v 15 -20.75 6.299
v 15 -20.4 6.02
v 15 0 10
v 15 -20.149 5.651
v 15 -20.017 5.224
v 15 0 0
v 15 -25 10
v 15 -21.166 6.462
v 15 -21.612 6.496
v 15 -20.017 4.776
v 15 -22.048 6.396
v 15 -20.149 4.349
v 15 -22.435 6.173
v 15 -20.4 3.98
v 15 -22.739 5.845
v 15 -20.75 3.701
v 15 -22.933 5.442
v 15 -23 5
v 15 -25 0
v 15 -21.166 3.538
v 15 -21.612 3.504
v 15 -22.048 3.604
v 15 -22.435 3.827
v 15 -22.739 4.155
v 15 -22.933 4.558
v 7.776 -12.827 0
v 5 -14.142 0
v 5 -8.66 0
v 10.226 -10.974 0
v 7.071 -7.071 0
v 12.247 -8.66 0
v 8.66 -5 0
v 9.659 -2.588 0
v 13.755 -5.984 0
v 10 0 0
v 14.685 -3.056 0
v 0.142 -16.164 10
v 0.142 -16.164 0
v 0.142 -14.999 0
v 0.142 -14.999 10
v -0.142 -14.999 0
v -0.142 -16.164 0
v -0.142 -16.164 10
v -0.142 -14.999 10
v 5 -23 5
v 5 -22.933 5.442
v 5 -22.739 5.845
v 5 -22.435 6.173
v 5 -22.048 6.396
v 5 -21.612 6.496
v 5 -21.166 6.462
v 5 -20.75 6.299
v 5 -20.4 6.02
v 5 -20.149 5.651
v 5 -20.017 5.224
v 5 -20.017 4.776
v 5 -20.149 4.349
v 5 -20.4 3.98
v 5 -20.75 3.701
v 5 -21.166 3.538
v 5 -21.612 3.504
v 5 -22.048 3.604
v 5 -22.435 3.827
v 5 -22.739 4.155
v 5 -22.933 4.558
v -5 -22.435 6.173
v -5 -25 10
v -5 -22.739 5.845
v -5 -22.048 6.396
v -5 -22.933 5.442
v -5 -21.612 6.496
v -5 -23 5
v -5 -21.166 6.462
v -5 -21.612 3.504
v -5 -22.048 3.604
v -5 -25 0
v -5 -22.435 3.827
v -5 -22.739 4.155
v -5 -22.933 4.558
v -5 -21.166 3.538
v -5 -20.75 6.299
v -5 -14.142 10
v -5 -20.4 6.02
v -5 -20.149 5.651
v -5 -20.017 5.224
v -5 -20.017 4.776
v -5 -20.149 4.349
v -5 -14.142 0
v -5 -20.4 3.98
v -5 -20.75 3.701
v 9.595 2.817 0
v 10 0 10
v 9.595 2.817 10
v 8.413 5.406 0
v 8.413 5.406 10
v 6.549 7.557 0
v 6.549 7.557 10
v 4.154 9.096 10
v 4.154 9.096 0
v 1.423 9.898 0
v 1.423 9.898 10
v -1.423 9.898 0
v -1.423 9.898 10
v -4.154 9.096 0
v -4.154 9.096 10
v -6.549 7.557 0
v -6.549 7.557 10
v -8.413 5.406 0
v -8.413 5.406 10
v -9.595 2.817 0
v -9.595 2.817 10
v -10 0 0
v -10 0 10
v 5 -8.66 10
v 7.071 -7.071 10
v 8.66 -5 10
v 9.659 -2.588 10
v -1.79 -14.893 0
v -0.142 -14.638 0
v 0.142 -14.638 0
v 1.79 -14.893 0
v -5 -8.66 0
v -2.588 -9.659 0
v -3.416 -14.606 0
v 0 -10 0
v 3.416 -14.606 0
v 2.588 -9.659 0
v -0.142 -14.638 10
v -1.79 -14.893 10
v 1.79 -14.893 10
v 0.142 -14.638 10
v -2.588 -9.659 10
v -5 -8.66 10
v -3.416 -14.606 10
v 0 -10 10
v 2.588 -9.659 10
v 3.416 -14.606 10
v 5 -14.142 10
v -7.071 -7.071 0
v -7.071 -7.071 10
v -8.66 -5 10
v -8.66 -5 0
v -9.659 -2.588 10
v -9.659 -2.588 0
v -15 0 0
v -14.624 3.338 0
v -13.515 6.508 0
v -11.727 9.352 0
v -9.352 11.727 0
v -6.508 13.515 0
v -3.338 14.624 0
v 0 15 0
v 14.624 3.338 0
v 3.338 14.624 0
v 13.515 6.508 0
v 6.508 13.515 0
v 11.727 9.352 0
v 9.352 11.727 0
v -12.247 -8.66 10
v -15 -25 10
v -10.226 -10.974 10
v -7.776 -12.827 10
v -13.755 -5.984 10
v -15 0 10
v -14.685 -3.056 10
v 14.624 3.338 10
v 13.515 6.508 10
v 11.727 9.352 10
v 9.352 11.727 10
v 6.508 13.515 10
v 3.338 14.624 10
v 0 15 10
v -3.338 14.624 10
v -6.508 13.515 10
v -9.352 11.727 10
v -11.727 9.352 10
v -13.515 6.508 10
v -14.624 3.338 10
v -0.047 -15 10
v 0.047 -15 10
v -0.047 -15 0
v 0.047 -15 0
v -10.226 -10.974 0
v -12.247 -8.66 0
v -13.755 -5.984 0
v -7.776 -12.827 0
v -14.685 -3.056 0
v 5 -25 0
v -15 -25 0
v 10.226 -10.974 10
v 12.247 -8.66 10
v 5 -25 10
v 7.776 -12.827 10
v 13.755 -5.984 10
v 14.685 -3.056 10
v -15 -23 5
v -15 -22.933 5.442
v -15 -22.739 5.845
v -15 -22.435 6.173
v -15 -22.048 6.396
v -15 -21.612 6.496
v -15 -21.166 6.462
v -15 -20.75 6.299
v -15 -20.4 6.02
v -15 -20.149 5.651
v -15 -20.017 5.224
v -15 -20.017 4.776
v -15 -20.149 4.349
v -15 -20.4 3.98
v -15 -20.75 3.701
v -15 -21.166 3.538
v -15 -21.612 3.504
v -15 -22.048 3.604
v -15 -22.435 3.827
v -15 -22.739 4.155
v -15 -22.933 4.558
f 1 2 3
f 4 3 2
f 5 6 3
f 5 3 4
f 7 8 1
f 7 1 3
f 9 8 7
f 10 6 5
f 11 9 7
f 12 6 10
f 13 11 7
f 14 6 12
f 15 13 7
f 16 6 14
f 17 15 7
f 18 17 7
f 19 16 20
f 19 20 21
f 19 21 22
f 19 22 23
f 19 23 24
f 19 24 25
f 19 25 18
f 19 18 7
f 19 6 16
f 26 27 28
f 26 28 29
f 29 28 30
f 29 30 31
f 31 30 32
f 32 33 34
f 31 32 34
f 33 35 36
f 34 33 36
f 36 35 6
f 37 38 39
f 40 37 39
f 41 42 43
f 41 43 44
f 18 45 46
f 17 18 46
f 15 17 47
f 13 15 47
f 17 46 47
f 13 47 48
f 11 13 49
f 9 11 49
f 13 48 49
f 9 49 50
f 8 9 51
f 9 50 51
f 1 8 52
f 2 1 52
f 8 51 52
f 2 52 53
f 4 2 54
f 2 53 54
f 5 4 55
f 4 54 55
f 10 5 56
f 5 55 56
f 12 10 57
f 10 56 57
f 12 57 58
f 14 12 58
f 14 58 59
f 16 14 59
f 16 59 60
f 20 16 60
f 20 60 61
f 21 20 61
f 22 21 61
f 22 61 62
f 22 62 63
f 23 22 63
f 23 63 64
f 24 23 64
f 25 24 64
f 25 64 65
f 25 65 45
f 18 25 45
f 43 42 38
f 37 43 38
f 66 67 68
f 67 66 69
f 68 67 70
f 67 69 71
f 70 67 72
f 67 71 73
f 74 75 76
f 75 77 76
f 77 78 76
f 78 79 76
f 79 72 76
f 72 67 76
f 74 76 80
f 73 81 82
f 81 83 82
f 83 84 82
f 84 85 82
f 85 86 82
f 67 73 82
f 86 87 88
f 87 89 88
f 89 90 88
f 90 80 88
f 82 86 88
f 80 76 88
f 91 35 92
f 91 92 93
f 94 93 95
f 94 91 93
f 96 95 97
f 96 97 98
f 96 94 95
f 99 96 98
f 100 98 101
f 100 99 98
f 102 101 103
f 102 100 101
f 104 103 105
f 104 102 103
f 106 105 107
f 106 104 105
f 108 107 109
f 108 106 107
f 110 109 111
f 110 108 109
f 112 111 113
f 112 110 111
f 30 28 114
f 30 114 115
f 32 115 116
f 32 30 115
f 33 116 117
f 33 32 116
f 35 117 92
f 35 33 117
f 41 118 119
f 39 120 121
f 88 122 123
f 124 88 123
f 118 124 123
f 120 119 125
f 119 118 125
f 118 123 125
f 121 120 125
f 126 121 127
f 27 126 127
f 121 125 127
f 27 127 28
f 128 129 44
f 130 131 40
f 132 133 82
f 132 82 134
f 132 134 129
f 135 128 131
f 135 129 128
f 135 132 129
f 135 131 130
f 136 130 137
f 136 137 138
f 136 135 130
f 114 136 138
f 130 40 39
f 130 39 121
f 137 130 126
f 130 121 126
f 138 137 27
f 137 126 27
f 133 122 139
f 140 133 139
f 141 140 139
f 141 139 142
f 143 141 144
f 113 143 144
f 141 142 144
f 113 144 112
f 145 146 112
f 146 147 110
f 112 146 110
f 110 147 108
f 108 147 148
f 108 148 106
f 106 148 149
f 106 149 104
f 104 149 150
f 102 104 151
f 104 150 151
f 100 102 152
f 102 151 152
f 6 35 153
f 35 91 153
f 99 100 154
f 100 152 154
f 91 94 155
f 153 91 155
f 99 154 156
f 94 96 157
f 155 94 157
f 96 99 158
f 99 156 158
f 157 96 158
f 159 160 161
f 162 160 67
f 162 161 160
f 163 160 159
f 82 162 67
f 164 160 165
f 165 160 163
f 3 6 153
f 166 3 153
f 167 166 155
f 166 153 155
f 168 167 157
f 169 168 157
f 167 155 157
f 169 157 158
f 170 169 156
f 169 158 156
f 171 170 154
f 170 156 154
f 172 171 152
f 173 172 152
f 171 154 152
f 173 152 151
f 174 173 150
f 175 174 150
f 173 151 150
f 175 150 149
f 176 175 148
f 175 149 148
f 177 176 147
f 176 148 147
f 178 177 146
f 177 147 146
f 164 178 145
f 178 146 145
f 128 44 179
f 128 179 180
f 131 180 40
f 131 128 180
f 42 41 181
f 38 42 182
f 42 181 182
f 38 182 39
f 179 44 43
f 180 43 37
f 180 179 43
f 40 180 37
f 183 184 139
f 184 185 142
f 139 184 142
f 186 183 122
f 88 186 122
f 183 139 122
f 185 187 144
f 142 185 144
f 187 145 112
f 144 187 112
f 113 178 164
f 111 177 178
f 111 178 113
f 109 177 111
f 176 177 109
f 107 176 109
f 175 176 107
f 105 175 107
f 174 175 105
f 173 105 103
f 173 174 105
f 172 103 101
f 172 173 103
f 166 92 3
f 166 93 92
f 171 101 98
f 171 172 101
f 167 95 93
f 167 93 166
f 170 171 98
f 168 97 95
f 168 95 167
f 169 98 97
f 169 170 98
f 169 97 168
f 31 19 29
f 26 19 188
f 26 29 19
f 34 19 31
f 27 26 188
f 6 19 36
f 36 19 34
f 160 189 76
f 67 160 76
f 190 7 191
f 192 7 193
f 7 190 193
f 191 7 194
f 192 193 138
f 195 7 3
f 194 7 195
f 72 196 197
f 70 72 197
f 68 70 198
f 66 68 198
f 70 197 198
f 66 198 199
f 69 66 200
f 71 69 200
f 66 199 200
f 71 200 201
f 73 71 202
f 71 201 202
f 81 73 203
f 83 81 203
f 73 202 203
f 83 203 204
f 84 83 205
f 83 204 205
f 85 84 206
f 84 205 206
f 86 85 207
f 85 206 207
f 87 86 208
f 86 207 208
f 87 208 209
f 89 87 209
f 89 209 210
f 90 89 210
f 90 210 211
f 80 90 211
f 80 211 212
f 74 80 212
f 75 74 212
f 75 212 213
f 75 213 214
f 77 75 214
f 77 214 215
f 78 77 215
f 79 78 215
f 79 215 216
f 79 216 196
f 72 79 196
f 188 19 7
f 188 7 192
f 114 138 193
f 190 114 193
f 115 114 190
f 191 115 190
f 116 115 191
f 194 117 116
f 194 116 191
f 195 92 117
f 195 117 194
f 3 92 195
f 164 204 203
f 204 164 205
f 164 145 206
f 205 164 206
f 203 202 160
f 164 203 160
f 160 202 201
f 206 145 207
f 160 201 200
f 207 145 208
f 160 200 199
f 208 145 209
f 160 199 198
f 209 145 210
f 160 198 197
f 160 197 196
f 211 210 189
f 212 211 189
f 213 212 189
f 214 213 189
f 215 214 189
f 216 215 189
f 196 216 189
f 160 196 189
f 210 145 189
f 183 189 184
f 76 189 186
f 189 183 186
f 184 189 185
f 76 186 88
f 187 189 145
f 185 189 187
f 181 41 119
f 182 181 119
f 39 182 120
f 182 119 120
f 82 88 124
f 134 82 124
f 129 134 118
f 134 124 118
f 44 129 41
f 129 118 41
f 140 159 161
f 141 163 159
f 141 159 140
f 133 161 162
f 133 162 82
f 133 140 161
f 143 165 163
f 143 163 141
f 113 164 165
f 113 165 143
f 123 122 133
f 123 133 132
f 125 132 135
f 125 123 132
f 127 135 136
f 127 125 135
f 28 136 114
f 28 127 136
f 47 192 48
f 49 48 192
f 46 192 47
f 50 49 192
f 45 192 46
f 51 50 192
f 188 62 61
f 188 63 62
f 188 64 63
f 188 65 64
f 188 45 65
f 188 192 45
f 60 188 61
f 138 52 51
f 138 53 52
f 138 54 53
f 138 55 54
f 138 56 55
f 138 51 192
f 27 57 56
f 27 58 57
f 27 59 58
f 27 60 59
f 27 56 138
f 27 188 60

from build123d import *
from build123d.topology import SkipClean

# Parameters (mm, degrees)
ESQUISSE1_R             = 15
ESQUISSE1_R_2           = 10
BOSS_EXTRU_1_DEPTH      = 10
BOSS_EXTRU_2_START      = -10
ESQUISSE2_W             = 0.284758048
ESQUISSE2_H             = 1.526135502
BOSS_EXTRU_2_DEPTH      = 10
ESQUISSE3_R             = 1.5
ENL_V_MAT_EXTRU_1_DEPTH = 41.311288741


with BuildPart() as part:
    # Esquisse1 → Boss.-Extru.1 (new body)
    with BuildSketch(Plane.XY):
        Circle(ESQUISSE1_R)
        Circle(ESQUISSE1_R_2, mode=Mode.SUBTRACT)
    extrude(amount=BOSS_EXTRU_1_DEPTH)

    # Esquisse2 → Boss.-Extru.2 (add)
    with SkipClean():  # the faces are left unmerged after this step: merging them gives an invalid solid
        with BuildSketch(Plane.XY.offset(10).offset(BOSS_EXTRU_2_START)):
            with BuildLine():
                Line((15, 0), (15, -25))
                Line((15, -25), (5, -25))
                Line((5, -25), (5, -8.660254038))
                ThreePointArc((5, -8.660254038), (8.660254038, -5), (10, 0))
                Line((10, 0), (15, 0))
            make_face()
            with Locations((0, -15.401311239)):
                Rectangle(ESQUISSE2_W, ESQUISSE2_H)
            with BuildLine():
                Line((-10, 0), (-15, 0))
                Line((-15, 0), (-15, -25))
                Line((-15, -25), (-5, -25))
                Line((-5, -25), (-5, -8.660254038))
                ThreePointArc((-5, -8.660254038), (-8.660254038, -5), (-10, 0))
            make_face()
        extrude(amount=BOSS_EXTRU_2_DEPTH)

    # Esquisse3 → Enlèv. mat.-Extru.1 (cut, through all)
    with SkipClean():  # the faces are left unmerged after this step: merging them gives an invalid solid
        with BuildSketch(Plane.ZY.offset(15)):
            with Locations(Location((5, -21.5, 0), (0, 0, 270))):
                Circle(ESQUISSE3_R)
        extrude(amount=-ENL_V_MAT_EXTRU_1_DEPTH, mode=Mode.SUBTRACT)


solid = part.part
